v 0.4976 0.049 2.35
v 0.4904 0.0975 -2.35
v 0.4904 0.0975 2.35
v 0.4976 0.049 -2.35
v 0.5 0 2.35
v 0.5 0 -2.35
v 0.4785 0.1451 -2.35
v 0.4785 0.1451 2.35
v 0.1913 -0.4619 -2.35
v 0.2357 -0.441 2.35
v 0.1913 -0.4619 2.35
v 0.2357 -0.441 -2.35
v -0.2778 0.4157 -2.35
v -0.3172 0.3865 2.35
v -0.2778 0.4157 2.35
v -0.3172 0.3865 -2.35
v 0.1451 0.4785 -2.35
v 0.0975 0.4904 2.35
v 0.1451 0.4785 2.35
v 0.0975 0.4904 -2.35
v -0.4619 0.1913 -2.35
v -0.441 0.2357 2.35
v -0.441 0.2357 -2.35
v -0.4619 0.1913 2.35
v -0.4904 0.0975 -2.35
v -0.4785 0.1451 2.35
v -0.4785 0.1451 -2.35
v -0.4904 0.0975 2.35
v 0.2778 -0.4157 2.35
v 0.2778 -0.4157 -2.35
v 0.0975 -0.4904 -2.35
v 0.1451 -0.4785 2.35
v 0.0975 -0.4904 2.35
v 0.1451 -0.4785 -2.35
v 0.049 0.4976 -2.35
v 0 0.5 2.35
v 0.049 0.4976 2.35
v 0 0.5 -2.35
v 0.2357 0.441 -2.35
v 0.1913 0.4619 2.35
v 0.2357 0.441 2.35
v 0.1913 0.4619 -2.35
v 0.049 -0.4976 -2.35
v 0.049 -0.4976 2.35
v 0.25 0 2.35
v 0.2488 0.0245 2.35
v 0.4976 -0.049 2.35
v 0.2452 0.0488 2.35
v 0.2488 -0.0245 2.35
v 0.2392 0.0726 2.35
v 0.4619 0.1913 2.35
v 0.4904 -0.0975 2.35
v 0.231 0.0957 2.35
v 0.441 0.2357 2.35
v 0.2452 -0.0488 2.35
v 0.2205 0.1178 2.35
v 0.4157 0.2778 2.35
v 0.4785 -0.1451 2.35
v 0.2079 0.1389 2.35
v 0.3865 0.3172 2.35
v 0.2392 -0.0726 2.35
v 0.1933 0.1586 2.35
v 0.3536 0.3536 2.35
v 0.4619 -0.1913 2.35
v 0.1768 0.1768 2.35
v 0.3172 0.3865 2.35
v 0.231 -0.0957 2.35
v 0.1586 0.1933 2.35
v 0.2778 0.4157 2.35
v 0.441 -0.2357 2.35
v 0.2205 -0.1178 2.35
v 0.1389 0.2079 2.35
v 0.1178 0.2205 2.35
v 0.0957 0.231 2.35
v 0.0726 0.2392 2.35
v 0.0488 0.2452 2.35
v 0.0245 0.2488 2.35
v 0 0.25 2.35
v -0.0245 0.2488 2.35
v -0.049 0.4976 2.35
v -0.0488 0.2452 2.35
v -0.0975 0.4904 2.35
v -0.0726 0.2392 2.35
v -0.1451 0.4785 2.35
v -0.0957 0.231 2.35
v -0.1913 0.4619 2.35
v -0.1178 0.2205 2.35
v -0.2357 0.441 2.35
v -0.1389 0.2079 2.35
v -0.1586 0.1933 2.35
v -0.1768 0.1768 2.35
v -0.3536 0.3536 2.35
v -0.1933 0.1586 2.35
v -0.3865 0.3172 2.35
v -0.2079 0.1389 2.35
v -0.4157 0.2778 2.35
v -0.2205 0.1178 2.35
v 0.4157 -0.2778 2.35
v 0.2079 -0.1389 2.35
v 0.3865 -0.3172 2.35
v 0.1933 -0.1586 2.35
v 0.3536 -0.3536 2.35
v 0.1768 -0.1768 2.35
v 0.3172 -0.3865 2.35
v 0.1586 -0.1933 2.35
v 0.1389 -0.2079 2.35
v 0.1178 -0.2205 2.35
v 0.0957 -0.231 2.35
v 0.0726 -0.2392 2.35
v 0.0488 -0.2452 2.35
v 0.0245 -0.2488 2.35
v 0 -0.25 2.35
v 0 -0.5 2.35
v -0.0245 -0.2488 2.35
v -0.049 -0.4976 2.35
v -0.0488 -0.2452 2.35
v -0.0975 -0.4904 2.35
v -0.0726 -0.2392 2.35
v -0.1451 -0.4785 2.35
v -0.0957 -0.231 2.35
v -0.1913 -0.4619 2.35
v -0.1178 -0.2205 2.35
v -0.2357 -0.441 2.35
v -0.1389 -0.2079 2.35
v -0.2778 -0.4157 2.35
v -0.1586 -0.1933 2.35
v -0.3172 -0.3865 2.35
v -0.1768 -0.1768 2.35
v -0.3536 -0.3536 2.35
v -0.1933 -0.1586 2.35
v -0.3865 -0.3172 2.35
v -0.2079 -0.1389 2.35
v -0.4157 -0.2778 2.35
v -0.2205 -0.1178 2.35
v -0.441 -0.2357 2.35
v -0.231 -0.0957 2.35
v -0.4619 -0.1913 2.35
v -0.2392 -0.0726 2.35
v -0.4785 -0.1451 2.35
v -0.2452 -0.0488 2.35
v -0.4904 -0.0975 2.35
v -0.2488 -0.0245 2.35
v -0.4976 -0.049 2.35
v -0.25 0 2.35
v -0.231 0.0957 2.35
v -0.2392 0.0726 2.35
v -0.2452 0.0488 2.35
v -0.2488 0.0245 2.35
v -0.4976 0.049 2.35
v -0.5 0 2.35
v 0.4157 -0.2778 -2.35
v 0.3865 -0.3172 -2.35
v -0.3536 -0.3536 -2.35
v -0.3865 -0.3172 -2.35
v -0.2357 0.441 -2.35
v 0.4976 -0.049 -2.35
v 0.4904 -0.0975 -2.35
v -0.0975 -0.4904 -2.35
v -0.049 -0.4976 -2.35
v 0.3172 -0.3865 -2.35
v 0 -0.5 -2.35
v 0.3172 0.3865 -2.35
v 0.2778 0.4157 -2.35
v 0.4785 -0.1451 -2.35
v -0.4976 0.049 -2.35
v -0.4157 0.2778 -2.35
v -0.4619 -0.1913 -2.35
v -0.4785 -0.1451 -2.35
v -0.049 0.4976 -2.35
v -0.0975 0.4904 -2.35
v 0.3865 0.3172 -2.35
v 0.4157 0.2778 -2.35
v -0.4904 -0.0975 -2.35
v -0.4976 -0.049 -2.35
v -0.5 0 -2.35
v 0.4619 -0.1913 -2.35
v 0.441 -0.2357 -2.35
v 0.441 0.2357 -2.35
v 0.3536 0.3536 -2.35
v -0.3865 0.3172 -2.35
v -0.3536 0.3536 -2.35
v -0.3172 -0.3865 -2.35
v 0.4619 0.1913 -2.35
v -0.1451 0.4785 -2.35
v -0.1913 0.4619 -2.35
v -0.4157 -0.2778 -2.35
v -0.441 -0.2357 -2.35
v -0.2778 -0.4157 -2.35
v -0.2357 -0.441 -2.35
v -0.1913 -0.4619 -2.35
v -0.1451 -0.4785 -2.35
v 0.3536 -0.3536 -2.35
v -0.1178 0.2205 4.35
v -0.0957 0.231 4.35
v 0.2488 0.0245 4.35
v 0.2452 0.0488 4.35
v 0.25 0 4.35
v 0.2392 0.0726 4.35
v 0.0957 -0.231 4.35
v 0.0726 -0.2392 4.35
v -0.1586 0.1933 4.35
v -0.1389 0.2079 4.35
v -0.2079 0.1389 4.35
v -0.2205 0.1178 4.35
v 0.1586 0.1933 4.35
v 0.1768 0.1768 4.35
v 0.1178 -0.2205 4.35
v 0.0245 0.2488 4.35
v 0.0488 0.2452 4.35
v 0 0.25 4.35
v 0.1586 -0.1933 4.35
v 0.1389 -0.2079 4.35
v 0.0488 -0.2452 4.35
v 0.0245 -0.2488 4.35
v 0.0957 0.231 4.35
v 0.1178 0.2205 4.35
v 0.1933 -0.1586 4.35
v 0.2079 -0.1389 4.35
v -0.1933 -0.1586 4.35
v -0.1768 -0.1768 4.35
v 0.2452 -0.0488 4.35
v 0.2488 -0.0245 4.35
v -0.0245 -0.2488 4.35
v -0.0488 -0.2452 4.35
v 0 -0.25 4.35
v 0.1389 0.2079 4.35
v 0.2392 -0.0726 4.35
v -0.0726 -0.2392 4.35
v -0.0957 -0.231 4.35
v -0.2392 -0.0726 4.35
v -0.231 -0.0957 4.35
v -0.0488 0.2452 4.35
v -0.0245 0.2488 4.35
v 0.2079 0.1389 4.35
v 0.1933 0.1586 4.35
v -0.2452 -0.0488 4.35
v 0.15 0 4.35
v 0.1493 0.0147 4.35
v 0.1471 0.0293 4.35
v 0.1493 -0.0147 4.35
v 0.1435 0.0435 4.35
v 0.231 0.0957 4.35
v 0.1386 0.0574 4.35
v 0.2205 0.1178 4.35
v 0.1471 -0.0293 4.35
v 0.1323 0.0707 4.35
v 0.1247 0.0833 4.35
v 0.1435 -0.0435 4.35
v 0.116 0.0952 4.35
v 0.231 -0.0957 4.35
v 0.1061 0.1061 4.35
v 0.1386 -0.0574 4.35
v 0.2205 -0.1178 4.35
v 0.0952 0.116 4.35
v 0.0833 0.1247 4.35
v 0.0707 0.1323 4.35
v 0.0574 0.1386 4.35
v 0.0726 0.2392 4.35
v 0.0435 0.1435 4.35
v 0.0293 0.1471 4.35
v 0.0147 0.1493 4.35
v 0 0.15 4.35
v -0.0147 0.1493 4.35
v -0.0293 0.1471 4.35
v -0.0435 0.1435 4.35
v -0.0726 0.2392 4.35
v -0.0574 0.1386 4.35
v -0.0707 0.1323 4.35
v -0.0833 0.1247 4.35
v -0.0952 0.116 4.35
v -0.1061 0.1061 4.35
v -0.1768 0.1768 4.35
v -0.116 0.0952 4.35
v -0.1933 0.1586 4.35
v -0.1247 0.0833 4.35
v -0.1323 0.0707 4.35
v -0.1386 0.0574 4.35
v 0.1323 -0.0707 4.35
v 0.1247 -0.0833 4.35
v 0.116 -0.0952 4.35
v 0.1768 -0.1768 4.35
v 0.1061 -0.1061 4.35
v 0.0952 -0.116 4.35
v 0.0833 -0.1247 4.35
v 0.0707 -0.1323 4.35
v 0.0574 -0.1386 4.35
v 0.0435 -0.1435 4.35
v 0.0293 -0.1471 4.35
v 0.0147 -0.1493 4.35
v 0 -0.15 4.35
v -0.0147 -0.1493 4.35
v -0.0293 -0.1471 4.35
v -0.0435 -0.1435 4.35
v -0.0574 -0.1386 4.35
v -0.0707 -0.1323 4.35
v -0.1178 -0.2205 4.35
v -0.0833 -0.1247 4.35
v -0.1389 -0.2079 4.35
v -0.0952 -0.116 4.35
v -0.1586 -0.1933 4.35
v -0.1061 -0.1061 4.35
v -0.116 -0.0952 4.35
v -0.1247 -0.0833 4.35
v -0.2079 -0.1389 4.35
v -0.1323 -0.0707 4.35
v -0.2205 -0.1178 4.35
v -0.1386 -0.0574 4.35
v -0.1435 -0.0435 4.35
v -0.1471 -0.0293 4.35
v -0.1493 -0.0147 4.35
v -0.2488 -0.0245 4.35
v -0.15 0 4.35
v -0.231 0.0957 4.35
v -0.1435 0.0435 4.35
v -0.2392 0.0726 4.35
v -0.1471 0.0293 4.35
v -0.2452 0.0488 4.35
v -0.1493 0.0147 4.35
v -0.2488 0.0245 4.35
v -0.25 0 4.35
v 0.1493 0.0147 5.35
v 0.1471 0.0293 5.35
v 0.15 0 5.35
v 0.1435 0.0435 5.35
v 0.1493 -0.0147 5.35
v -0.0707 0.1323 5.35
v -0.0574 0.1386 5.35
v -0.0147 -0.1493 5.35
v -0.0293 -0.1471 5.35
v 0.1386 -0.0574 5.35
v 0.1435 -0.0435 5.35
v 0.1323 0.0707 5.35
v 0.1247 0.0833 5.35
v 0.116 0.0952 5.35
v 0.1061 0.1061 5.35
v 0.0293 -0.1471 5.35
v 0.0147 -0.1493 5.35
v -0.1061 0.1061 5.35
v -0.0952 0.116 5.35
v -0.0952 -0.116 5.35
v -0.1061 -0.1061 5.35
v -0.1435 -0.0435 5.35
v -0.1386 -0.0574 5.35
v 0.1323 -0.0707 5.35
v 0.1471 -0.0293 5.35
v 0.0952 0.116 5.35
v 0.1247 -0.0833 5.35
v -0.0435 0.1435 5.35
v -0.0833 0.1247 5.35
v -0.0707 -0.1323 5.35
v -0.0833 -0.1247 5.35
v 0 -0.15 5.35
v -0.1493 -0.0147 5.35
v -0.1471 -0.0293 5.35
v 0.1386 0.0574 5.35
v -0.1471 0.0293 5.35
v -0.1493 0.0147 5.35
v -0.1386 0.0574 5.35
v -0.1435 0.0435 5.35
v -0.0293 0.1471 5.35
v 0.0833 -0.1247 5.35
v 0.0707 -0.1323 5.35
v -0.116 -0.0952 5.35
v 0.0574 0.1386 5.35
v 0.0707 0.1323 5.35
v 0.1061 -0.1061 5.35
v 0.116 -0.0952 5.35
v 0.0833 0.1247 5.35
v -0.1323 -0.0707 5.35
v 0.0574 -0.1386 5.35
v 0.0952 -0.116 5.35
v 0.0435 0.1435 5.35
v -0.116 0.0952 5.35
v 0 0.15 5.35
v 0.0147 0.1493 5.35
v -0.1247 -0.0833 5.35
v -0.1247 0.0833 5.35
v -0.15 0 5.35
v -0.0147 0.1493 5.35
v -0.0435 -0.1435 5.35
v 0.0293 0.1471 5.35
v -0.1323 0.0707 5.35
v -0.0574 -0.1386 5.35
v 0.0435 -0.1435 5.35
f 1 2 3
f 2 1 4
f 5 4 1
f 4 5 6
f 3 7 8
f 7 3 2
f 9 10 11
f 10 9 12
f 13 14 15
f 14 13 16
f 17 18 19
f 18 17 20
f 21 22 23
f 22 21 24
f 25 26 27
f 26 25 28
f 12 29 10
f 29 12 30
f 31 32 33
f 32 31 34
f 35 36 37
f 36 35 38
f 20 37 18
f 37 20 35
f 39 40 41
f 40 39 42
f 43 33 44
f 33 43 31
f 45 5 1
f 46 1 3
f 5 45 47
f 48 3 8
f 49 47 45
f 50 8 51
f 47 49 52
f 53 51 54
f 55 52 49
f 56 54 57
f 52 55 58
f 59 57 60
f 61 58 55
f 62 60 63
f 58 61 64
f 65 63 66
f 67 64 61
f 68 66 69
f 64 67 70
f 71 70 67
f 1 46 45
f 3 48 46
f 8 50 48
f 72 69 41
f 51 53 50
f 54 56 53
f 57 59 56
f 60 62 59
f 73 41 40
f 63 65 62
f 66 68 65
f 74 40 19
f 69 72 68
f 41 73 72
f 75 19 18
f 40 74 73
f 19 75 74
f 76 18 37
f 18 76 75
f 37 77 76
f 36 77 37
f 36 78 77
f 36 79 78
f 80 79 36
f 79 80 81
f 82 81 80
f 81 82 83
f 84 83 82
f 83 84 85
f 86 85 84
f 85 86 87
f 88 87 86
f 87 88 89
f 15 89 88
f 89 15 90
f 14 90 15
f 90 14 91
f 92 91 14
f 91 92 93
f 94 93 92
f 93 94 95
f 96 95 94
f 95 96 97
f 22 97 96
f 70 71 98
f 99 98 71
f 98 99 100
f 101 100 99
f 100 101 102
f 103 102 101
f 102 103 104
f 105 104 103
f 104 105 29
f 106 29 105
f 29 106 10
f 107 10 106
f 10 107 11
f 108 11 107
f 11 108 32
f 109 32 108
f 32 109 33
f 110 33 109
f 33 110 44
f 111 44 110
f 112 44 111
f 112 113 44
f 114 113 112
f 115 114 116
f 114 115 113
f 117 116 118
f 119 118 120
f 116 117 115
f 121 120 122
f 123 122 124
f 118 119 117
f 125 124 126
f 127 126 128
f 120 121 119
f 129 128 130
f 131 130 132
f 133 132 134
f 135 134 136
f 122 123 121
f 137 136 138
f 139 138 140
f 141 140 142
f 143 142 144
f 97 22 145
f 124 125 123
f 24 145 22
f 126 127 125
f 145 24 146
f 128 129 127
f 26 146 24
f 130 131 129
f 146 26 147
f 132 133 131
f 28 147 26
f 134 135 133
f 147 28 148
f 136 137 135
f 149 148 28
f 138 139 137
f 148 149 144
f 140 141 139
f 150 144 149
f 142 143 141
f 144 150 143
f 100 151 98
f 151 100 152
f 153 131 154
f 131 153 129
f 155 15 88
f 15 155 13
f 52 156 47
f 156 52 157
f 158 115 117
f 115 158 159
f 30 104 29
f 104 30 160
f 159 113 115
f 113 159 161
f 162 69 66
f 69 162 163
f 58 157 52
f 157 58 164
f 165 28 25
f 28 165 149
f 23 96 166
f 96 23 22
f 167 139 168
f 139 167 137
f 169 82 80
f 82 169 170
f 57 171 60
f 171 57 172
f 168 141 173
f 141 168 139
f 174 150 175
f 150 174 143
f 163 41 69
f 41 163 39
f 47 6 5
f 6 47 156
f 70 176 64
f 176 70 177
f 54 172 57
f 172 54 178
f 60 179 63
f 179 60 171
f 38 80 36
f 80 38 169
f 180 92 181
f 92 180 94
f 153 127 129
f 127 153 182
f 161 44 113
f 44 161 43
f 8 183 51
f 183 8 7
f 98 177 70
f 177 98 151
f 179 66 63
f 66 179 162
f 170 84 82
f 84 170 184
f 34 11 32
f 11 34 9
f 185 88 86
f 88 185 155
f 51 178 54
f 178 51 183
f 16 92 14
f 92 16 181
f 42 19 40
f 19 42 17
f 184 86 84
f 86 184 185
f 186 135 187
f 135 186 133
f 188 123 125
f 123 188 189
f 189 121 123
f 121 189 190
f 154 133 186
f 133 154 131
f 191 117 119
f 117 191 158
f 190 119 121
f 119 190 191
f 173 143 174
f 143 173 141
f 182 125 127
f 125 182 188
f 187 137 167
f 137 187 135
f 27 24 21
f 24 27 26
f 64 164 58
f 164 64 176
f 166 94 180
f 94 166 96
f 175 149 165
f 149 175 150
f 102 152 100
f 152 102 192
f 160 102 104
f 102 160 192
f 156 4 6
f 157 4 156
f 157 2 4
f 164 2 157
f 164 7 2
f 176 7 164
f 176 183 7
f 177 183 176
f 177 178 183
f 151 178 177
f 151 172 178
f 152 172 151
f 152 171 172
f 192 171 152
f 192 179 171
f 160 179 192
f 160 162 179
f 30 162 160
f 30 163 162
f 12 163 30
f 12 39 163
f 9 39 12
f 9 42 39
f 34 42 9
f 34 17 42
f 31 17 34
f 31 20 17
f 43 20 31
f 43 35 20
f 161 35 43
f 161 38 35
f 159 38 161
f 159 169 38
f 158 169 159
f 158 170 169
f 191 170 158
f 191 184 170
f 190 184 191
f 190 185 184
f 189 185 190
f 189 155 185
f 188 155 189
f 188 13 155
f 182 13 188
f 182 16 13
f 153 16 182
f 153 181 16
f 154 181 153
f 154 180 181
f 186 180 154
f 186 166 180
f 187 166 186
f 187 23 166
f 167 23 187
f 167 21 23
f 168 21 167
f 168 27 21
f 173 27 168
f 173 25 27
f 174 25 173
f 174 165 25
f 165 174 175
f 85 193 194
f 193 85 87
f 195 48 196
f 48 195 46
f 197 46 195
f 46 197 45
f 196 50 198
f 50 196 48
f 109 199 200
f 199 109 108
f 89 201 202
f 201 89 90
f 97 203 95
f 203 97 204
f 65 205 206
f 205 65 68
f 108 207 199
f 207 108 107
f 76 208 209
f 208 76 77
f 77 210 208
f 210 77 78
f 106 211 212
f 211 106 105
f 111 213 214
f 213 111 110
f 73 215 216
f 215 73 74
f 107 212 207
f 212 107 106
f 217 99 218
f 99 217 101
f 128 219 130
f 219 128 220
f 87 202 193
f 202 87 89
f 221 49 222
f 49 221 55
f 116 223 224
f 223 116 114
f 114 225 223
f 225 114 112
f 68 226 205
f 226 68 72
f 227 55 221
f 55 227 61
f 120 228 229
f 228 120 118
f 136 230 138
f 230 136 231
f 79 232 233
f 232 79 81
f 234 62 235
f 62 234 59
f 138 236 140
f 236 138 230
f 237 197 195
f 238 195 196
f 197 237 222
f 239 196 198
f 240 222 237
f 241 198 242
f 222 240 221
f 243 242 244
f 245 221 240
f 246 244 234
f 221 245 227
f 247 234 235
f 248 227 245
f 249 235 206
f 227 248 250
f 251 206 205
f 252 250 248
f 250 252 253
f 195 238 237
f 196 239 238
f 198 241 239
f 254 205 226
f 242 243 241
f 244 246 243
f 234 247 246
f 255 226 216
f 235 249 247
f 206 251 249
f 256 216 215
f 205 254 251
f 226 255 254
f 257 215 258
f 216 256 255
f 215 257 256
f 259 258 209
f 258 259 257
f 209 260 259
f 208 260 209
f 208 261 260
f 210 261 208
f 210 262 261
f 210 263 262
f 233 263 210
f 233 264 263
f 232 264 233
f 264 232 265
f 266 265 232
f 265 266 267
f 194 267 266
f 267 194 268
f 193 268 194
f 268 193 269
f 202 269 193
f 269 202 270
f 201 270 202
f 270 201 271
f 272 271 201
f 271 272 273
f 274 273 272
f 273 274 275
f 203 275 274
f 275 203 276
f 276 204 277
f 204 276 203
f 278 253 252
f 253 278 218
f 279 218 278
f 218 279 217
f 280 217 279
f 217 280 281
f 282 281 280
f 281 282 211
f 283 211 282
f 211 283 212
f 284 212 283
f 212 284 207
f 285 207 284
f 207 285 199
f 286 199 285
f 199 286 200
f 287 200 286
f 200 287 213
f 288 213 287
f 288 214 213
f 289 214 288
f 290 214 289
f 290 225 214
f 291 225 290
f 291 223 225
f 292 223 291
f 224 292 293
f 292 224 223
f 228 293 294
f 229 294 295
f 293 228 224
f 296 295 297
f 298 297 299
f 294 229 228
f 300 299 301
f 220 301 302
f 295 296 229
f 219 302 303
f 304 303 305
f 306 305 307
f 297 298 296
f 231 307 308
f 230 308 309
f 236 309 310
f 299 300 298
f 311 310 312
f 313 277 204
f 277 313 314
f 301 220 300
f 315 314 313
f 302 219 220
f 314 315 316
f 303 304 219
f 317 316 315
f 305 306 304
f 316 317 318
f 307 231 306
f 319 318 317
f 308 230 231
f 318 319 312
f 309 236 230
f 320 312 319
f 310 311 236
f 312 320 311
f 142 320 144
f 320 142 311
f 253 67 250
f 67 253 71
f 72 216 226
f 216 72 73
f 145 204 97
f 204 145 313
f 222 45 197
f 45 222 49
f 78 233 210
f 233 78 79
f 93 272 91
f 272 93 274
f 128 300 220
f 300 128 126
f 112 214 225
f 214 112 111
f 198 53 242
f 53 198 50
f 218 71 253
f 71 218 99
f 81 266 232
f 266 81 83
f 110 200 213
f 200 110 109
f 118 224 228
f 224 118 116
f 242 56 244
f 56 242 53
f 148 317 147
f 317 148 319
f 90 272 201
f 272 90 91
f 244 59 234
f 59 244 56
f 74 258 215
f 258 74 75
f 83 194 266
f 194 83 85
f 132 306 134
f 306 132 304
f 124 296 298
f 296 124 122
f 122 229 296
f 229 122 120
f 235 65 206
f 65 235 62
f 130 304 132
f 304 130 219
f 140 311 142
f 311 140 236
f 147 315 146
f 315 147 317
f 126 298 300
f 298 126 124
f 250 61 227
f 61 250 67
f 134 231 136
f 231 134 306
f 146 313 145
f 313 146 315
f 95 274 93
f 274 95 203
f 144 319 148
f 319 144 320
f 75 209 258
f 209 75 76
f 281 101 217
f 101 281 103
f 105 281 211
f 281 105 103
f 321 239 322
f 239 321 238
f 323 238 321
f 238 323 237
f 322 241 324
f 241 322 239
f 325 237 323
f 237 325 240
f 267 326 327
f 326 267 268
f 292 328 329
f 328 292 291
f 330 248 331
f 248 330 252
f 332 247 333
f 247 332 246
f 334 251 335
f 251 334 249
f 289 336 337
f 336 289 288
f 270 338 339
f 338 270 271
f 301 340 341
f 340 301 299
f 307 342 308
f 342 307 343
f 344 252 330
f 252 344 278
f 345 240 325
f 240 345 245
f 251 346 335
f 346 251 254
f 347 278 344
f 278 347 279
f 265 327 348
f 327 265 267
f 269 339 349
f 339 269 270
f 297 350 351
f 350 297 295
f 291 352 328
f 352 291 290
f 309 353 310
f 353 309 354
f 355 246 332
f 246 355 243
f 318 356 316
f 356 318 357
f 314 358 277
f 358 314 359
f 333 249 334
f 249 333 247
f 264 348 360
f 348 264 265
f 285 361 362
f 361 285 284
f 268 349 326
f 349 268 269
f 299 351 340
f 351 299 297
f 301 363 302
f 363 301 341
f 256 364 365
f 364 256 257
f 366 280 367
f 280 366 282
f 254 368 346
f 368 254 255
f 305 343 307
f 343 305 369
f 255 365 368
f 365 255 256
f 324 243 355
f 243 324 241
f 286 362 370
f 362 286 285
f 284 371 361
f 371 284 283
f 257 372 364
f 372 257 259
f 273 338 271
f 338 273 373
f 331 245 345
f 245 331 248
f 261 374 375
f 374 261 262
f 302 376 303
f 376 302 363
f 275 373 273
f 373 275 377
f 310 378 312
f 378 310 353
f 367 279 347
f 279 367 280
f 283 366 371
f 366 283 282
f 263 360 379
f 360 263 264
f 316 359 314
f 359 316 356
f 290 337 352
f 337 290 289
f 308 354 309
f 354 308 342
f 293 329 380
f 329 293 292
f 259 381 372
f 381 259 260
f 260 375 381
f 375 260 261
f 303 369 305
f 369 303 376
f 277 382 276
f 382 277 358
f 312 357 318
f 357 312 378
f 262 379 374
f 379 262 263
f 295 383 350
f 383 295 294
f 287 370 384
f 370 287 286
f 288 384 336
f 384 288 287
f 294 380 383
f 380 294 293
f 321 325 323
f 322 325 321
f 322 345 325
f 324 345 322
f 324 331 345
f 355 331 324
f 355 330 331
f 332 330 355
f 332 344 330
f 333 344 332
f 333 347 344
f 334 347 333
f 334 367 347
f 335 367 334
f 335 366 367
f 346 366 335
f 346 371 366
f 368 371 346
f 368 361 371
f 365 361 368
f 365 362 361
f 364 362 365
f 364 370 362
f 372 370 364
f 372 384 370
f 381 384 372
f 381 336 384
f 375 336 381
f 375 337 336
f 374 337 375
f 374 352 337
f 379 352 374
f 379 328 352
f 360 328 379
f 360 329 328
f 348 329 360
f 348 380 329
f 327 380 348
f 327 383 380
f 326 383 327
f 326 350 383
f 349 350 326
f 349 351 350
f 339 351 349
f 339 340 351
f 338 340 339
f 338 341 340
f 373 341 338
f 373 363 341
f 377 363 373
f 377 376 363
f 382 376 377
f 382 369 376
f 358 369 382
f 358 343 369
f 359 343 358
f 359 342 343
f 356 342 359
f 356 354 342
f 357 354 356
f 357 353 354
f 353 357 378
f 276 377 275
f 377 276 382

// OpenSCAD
// Toggle switch model (connected solid)
// Required: 1.0mm body diameter, 4.7mm body height

$fn = 64;

// Parameters (mm)
body_d = 1.0;
body_h = 4.7;

lever_d = 0.5;
lever_h = 2.0;

tip_d = 0.3;
tip_h = 1.0;

// Small overlap to guarantee manifold connectivity
overlap = 0.05;

module toggle_switch() {
    union() {
        // Body centered at origin
        cylinder(d = body_d, h = body_h, center = true);

        // Lever sits on top of body (with slight overlap)
        translate([0, 0, body_h/2 - overlap])
            cylinder(d = lever_d, h = lever_h + overlap, center = false);

        // Tip sits on top of lever (with slight overlap)
        translate([0, 0, body_h/2 + lever_h - overlap])
            cylinder(d = tip_d, h = tip_h + overlap, center = false);
    }
}

toggle_switch();
